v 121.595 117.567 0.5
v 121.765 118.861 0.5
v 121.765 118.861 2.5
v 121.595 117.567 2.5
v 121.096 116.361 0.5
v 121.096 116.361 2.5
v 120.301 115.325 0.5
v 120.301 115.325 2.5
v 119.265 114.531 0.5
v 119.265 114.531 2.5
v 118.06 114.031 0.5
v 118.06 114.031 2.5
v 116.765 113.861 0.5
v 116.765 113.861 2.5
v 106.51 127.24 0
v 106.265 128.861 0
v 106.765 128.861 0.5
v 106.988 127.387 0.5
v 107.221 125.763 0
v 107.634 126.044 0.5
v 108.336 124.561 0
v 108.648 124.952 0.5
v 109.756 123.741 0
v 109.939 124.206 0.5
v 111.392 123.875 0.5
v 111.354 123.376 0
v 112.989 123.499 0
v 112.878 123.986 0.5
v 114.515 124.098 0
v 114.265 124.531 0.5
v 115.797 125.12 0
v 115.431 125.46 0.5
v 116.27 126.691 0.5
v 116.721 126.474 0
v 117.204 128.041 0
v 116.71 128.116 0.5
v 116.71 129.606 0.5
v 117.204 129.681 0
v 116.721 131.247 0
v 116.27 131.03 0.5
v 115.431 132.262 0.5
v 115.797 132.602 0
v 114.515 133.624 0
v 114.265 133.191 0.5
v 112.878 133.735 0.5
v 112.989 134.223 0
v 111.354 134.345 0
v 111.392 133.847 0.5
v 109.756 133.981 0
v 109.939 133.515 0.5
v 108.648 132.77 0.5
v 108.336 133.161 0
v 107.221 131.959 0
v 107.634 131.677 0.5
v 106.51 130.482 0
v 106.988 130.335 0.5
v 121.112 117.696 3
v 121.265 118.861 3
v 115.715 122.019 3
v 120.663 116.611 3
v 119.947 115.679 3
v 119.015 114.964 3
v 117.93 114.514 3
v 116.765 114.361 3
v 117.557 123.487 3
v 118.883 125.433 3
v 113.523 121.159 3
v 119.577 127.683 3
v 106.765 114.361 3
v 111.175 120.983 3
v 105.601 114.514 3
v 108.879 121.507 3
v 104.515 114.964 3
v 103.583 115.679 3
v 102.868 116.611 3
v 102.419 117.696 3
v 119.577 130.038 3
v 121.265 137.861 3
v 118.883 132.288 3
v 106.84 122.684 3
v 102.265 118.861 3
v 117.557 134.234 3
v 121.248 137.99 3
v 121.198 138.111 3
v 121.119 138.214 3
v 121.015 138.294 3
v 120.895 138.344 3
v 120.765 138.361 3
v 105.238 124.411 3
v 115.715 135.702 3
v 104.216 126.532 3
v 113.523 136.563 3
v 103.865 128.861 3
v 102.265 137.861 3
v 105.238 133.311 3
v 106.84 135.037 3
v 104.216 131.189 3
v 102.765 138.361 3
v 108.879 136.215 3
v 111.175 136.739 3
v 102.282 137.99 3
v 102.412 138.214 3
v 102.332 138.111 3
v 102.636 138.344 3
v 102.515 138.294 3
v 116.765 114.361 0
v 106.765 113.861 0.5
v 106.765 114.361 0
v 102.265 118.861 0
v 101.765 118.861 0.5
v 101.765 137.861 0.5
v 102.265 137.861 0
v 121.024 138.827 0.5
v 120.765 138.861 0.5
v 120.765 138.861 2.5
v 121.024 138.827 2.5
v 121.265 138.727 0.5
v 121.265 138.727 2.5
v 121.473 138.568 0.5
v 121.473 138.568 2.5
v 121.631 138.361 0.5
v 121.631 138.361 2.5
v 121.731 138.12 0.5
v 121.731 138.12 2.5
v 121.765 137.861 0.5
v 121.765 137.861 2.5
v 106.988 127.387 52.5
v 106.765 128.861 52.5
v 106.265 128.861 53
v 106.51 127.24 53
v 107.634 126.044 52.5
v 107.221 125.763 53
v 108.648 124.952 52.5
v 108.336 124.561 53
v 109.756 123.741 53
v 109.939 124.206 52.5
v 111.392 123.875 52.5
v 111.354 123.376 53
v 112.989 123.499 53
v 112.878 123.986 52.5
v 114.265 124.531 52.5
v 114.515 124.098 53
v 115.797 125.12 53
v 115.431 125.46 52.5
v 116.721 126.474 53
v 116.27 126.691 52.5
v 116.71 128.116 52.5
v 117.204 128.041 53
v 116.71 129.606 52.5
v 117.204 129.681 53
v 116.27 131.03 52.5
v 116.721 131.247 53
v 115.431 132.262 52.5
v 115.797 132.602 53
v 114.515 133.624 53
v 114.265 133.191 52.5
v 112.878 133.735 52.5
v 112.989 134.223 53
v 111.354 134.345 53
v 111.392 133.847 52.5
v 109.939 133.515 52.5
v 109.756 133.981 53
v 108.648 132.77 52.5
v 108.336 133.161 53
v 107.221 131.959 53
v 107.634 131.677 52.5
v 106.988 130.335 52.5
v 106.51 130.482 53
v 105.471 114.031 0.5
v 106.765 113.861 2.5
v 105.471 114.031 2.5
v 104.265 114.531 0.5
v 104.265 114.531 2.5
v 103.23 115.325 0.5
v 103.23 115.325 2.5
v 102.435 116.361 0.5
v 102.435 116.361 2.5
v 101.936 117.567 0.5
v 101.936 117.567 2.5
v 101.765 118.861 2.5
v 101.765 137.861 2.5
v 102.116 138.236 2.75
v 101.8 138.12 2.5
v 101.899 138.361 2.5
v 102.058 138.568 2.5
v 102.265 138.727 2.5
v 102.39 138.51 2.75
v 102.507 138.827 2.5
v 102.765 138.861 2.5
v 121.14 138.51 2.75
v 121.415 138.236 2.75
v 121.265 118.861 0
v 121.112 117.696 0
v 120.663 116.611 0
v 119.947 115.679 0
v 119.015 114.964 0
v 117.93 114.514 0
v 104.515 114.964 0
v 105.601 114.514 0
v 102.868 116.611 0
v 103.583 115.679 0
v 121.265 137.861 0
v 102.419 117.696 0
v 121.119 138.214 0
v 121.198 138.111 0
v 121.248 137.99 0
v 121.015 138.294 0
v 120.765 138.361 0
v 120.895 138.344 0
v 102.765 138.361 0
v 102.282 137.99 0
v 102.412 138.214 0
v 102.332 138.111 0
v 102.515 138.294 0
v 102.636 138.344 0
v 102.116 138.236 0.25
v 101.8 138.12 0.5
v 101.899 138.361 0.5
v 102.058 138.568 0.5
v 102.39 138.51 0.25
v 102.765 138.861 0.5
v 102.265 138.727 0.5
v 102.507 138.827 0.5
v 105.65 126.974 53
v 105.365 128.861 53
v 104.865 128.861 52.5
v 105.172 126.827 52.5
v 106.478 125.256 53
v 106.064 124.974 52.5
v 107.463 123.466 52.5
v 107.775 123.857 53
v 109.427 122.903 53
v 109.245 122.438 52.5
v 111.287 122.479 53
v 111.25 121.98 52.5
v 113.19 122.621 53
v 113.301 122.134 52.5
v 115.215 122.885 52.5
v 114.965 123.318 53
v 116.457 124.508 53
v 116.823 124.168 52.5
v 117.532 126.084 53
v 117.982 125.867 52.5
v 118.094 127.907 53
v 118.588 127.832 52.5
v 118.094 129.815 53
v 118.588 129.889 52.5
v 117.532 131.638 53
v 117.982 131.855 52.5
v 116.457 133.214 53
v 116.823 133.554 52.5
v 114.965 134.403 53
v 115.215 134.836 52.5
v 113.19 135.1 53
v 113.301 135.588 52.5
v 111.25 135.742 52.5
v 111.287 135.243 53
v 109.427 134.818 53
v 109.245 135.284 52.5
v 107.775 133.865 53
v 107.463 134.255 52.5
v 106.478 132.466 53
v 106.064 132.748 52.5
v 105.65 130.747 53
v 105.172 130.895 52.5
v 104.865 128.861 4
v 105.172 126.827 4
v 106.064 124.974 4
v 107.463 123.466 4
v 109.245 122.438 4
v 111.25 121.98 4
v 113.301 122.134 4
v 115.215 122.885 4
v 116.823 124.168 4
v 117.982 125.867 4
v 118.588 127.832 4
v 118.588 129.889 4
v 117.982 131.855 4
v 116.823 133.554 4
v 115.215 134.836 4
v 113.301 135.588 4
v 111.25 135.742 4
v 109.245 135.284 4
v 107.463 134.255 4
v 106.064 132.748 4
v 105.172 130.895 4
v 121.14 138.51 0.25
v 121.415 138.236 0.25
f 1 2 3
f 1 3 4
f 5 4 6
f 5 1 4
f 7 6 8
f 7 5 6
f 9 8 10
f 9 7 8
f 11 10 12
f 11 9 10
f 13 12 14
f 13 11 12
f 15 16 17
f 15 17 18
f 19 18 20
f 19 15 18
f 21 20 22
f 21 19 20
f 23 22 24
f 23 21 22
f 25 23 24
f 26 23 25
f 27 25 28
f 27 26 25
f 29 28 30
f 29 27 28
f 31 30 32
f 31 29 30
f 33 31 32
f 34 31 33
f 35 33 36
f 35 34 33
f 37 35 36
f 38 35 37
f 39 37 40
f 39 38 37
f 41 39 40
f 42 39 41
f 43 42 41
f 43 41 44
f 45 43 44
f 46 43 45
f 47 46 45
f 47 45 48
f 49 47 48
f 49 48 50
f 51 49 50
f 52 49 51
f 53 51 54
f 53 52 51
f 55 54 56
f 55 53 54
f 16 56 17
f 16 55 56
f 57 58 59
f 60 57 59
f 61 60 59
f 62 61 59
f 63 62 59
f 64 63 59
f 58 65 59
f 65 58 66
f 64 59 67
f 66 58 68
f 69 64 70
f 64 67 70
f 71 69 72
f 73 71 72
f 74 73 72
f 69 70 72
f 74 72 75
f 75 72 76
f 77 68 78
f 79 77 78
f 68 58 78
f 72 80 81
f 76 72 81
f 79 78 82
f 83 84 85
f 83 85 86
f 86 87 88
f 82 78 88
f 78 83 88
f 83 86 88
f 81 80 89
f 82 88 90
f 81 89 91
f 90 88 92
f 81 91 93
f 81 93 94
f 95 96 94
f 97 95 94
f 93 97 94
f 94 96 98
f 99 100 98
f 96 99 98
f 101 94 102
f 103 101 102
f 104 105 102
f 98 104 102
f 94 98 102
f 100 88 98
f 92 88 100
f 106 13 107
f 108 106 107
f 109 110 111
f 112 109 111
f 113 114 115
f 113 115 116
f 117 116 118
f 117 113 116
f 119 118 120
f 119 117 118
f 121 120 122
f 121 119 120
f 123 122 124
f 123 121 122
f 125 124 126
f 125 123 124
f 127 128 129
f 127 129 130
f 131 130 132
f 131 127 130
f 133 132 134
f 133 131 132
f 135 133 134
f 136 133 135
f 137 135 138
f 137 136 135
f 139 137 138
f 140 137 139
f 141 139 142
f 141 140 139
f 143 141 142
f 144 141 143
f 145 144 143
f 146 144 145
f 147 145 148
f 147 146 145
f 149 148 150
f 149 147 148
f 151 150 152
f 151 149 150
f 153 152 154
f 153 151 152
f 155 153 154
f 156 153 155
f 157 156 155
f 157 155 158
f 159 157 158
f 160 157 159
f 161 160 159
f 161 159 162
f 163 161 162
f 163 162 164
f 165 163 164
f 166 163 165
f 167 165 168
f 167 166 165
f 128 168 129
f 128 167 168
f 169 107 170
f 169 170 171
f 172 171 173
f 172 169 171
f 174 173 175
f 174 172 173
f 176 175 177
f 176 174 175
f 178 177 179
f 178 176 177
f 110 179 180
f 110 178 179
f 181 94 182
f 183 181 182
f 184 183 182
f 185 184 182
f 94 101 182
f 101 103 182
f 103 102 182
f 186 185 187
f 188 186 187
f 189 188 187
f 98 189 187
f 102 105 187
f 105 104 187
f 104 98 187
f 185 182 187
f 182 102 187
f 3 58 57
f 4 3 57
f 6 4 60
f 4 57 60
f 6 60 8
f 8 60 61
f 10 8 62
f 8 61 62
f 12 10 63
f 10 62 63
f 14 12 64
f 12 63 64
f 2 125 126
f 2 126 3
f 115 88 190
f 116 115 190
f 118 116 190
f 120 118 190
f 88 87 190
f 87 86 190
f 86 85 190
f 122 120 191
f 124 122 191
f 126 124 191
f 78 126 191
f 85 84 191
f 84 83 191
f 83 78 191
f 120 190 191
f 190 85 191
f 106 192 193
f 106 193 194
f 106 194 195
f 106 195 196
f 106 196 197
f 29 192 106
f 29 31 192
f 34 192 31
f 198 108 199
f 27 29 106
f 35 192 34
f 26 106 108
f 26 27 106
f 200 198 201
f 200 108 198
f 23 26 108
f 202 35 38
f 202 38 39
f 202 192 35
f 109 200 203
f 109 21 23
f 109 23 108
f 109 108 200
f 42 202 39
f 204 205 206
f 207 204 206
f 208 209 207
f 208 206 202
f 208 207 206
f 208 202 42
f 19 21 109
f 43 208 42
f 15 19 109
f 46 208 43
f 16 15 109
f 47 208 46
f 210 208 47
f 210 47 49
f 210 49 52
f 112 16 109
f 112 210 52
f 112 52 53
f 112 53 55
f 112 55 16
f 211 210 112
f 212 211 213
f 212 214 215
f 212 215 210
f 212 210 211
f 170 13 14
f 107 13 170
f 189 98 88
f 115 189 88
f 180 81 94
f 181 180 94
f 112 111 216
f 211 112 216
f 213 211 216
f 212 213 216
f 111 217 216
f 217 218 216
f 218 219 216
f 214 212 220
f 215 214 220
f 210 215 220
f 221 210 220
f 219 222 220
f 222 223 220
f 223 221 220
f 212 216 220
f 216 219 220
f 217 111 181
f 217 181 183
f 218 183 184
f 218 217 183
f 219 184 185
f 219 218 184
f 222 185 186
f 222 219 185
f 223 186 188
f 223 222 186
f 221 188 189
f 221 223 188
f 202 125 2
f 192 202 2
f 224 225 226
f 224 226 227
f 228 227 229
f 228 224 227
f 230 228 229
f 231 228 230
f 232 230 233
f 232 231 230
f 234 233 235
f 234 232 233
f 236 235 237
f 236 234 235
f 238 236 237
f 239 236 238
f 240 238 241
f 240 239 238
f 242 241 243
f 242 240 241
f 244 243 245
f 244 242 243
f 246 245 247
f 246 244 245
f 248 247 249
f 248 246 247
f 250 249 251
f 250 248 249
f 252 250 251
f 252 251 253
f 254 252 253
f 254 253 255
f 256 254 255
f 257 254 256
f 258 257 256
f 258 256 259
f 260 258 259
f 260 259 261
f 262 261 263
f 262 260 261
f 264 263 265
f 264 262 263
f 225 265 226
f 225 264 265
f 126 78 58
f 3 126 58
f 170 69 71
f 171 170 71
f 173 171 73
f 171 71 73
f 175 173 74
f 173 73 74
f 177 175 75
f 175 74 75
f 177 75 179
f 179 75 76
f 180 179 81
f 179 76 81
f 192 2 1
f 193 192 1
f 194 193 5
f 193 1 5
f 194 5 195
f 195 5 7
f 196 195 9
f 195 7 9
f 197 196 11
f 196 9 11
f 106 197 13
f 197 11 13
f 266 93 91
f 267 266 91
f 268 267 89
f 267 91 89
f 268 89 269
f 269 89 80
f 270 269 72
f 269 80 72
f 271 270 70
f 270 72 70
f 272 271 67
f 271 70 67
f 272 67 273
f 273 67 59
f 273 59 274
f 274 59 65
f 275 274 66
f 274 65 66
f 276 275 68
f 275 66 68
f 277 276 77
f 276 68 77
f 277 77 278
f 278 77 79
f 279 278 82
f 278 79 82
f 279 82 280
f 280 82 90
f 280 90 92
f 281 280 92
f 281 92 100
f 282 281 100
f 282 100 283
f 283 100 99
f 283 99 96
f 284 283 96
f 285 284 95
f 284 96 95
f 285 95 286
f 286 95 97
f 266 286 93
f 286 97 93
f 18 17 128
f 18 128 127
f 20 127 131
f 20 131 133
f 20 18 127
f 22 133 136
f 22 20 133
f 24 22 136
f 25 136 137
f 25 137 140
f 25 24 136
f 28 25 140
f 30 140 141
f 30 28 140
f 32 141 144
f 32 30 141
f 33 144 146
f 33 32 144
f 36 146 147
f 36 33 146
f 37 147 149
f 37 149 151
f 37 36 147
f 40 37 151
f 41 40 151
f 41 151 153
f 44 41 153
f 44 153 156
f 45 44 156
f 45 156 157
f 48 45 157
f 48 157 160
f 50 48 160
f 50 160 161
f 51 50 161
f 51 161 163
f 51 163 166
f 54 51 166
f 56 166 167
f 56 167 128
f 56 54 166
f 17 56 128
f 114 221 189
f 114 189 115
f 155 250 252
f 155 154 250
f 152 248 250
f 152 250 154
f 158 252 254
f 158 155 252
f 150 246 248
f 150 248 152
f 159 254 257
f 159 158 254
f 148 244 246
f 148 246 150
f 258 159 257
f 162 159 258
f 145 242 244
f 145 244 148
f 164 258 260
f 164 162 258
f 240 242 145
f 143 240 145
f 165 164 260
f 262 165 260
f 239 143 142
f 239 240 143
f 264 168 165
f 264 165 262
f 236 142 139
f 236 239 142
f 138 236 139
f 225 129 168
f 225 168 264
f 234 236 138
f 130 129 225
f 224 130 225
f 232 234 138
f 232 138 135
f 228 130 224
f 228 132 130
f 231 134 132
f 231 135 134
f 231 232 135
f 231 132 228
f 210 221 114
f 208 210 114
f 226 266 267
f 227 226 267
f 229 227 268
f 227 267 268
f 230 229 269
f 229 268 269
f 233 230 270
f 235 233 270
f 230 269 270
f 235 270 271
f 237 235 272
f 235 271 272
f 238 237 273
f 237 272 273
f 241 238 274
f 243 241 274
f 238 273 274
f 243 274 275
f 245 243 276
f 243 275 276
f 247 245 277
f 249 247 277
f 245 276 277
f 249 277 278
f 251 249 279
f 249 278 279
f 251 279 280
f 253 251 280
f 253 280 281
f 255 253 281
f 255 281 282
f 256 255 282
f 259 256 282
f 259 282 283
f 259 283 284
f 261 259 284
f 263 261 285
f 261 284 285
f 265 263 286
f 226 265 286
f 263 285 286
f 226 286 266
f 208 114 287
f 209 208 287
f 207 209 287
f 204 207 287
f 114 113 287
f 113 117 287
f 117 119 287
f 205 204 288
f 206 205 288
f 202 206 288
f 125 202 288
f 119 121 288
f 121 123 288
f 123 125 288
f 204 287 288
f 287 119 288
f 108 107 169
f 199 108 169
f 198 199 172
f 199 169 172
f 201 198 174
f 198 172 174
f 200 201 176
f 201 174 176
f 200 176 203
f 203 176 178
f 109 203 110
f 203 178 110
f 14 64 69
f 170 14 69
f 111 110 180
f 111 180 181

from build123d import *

# Parameters (mm, degrees)
SKETCH2_R           = 6.9
BOSS_EXTRUDE1_DEPTH = 3
SKETCH3_R           = 6.9
SKETCH3_R_2         = 5
BOSS_EXTRUDE2_DEPTH = 53
CHAMFER1_SIZE       = 0.5
CHAMFER2_SIZE       = 1


with BuildPart() as part:
    # Sketch2 → Boss-Extrude1 (new body)
    with BuildSketch(Plane.XY):
        with BuildLine():
            Line((102.765440341, 138.860814374), (120.765440341, 138.860814374))
            ThreePointArc((120.765440341, 138.860814374), (121.472547122, 138.567921155), (121.765440341, 137.860814374))
            Line((121.765440341, 137.860814374), (121.765440341, 118.860814374))
            ThreePointArc((121.765440341, 118.860814374), (120.300974247, 115.325280468), (116.765440341, 113.860814374))
            Line((116.765440341, 113.860814374), (106.765440341, 113.860814374))
            ThreePointArc((106.765440341, 113.860814374), (103.229906435, 115.325280468), (101.765440341, 118.860814374))
            Line((101.765440341, 118.860814374), (101.765440341, 137.860814374))
            ThreePointArc((101.765440341, 137.860814374), (102.058333559, 138.567921155), (102.765440341, 138.860814374))
        make_face()
        with Locations((111.765440341, 128.860814374)):
            Circle(SKETCH2_R, mode=Mode.SUBTRACT)
    extrude(amount=BOSS_EXTRUDE1_DEPTH)

    # Sketch3 → Boss-Extrude2 (add)
    with BuildSketch(Plane.XY):
        with Locations(Location((111.765440341, 128.860814374, 0), (0, 0, 180))):
            Circle(SKETCH3_R)
        with Locations(Location((111.765440341, 128.860814374, 0), (0, 0, 180))):
            Circle(SKETCH3_R_2, mode=Mode.SUBTRACT)
    extrude(amount=BOSS_EXTRUDE2_DEPTH)

    # Chamfer1
    chamfer1_edges = [part.edges().sort_by_distance(p)[0] for p in [
        (121.472547122, 138.567921155, 0),
        (121.765440341, 128.360814374, 0),
        (111.765440341, 138.860814374, 3),
        (120.300974247, 115.325280468, 0),
        (111.765440341, 113.860814374, 0),
        (103.229906435, 115.325280468, 0),
        (101.765440341, 128.360814374, 0),
        (102.058333559, 138.567921155, 0),
        (111.765440341, 138.860814374, 0),
        (102.058333559, 138.567921155, 3),
        (101.765440341, 128.360814374, 3),
        (103.229906435, 115.325280468, 3),
        (118.665440341, 128.860814374, 53),
        (116.765440341, 128.860814374, 0),
        (116.765440341, 128.860814374, 53),
        (111.765440341, 113.860814374, 3),
        (120.300974247, 115.325280468, 3),
        (121.765440341, 128.360814374, 3),
        (121.472547122, 138.567921155, 3),
    ]]
    chamfer(chamfer1_edges, length=CHAMFER1_SIZE)

    # Chamfer2
    chamfer2_edges = [part.edges().sort_by_distance(p)[0] for p in [
        (118.665440341, 128.860814374, 3),
    ]]
    chamfer(chamfer2_edges, length=CHAMFER2_SIZE)


solid = part.part
